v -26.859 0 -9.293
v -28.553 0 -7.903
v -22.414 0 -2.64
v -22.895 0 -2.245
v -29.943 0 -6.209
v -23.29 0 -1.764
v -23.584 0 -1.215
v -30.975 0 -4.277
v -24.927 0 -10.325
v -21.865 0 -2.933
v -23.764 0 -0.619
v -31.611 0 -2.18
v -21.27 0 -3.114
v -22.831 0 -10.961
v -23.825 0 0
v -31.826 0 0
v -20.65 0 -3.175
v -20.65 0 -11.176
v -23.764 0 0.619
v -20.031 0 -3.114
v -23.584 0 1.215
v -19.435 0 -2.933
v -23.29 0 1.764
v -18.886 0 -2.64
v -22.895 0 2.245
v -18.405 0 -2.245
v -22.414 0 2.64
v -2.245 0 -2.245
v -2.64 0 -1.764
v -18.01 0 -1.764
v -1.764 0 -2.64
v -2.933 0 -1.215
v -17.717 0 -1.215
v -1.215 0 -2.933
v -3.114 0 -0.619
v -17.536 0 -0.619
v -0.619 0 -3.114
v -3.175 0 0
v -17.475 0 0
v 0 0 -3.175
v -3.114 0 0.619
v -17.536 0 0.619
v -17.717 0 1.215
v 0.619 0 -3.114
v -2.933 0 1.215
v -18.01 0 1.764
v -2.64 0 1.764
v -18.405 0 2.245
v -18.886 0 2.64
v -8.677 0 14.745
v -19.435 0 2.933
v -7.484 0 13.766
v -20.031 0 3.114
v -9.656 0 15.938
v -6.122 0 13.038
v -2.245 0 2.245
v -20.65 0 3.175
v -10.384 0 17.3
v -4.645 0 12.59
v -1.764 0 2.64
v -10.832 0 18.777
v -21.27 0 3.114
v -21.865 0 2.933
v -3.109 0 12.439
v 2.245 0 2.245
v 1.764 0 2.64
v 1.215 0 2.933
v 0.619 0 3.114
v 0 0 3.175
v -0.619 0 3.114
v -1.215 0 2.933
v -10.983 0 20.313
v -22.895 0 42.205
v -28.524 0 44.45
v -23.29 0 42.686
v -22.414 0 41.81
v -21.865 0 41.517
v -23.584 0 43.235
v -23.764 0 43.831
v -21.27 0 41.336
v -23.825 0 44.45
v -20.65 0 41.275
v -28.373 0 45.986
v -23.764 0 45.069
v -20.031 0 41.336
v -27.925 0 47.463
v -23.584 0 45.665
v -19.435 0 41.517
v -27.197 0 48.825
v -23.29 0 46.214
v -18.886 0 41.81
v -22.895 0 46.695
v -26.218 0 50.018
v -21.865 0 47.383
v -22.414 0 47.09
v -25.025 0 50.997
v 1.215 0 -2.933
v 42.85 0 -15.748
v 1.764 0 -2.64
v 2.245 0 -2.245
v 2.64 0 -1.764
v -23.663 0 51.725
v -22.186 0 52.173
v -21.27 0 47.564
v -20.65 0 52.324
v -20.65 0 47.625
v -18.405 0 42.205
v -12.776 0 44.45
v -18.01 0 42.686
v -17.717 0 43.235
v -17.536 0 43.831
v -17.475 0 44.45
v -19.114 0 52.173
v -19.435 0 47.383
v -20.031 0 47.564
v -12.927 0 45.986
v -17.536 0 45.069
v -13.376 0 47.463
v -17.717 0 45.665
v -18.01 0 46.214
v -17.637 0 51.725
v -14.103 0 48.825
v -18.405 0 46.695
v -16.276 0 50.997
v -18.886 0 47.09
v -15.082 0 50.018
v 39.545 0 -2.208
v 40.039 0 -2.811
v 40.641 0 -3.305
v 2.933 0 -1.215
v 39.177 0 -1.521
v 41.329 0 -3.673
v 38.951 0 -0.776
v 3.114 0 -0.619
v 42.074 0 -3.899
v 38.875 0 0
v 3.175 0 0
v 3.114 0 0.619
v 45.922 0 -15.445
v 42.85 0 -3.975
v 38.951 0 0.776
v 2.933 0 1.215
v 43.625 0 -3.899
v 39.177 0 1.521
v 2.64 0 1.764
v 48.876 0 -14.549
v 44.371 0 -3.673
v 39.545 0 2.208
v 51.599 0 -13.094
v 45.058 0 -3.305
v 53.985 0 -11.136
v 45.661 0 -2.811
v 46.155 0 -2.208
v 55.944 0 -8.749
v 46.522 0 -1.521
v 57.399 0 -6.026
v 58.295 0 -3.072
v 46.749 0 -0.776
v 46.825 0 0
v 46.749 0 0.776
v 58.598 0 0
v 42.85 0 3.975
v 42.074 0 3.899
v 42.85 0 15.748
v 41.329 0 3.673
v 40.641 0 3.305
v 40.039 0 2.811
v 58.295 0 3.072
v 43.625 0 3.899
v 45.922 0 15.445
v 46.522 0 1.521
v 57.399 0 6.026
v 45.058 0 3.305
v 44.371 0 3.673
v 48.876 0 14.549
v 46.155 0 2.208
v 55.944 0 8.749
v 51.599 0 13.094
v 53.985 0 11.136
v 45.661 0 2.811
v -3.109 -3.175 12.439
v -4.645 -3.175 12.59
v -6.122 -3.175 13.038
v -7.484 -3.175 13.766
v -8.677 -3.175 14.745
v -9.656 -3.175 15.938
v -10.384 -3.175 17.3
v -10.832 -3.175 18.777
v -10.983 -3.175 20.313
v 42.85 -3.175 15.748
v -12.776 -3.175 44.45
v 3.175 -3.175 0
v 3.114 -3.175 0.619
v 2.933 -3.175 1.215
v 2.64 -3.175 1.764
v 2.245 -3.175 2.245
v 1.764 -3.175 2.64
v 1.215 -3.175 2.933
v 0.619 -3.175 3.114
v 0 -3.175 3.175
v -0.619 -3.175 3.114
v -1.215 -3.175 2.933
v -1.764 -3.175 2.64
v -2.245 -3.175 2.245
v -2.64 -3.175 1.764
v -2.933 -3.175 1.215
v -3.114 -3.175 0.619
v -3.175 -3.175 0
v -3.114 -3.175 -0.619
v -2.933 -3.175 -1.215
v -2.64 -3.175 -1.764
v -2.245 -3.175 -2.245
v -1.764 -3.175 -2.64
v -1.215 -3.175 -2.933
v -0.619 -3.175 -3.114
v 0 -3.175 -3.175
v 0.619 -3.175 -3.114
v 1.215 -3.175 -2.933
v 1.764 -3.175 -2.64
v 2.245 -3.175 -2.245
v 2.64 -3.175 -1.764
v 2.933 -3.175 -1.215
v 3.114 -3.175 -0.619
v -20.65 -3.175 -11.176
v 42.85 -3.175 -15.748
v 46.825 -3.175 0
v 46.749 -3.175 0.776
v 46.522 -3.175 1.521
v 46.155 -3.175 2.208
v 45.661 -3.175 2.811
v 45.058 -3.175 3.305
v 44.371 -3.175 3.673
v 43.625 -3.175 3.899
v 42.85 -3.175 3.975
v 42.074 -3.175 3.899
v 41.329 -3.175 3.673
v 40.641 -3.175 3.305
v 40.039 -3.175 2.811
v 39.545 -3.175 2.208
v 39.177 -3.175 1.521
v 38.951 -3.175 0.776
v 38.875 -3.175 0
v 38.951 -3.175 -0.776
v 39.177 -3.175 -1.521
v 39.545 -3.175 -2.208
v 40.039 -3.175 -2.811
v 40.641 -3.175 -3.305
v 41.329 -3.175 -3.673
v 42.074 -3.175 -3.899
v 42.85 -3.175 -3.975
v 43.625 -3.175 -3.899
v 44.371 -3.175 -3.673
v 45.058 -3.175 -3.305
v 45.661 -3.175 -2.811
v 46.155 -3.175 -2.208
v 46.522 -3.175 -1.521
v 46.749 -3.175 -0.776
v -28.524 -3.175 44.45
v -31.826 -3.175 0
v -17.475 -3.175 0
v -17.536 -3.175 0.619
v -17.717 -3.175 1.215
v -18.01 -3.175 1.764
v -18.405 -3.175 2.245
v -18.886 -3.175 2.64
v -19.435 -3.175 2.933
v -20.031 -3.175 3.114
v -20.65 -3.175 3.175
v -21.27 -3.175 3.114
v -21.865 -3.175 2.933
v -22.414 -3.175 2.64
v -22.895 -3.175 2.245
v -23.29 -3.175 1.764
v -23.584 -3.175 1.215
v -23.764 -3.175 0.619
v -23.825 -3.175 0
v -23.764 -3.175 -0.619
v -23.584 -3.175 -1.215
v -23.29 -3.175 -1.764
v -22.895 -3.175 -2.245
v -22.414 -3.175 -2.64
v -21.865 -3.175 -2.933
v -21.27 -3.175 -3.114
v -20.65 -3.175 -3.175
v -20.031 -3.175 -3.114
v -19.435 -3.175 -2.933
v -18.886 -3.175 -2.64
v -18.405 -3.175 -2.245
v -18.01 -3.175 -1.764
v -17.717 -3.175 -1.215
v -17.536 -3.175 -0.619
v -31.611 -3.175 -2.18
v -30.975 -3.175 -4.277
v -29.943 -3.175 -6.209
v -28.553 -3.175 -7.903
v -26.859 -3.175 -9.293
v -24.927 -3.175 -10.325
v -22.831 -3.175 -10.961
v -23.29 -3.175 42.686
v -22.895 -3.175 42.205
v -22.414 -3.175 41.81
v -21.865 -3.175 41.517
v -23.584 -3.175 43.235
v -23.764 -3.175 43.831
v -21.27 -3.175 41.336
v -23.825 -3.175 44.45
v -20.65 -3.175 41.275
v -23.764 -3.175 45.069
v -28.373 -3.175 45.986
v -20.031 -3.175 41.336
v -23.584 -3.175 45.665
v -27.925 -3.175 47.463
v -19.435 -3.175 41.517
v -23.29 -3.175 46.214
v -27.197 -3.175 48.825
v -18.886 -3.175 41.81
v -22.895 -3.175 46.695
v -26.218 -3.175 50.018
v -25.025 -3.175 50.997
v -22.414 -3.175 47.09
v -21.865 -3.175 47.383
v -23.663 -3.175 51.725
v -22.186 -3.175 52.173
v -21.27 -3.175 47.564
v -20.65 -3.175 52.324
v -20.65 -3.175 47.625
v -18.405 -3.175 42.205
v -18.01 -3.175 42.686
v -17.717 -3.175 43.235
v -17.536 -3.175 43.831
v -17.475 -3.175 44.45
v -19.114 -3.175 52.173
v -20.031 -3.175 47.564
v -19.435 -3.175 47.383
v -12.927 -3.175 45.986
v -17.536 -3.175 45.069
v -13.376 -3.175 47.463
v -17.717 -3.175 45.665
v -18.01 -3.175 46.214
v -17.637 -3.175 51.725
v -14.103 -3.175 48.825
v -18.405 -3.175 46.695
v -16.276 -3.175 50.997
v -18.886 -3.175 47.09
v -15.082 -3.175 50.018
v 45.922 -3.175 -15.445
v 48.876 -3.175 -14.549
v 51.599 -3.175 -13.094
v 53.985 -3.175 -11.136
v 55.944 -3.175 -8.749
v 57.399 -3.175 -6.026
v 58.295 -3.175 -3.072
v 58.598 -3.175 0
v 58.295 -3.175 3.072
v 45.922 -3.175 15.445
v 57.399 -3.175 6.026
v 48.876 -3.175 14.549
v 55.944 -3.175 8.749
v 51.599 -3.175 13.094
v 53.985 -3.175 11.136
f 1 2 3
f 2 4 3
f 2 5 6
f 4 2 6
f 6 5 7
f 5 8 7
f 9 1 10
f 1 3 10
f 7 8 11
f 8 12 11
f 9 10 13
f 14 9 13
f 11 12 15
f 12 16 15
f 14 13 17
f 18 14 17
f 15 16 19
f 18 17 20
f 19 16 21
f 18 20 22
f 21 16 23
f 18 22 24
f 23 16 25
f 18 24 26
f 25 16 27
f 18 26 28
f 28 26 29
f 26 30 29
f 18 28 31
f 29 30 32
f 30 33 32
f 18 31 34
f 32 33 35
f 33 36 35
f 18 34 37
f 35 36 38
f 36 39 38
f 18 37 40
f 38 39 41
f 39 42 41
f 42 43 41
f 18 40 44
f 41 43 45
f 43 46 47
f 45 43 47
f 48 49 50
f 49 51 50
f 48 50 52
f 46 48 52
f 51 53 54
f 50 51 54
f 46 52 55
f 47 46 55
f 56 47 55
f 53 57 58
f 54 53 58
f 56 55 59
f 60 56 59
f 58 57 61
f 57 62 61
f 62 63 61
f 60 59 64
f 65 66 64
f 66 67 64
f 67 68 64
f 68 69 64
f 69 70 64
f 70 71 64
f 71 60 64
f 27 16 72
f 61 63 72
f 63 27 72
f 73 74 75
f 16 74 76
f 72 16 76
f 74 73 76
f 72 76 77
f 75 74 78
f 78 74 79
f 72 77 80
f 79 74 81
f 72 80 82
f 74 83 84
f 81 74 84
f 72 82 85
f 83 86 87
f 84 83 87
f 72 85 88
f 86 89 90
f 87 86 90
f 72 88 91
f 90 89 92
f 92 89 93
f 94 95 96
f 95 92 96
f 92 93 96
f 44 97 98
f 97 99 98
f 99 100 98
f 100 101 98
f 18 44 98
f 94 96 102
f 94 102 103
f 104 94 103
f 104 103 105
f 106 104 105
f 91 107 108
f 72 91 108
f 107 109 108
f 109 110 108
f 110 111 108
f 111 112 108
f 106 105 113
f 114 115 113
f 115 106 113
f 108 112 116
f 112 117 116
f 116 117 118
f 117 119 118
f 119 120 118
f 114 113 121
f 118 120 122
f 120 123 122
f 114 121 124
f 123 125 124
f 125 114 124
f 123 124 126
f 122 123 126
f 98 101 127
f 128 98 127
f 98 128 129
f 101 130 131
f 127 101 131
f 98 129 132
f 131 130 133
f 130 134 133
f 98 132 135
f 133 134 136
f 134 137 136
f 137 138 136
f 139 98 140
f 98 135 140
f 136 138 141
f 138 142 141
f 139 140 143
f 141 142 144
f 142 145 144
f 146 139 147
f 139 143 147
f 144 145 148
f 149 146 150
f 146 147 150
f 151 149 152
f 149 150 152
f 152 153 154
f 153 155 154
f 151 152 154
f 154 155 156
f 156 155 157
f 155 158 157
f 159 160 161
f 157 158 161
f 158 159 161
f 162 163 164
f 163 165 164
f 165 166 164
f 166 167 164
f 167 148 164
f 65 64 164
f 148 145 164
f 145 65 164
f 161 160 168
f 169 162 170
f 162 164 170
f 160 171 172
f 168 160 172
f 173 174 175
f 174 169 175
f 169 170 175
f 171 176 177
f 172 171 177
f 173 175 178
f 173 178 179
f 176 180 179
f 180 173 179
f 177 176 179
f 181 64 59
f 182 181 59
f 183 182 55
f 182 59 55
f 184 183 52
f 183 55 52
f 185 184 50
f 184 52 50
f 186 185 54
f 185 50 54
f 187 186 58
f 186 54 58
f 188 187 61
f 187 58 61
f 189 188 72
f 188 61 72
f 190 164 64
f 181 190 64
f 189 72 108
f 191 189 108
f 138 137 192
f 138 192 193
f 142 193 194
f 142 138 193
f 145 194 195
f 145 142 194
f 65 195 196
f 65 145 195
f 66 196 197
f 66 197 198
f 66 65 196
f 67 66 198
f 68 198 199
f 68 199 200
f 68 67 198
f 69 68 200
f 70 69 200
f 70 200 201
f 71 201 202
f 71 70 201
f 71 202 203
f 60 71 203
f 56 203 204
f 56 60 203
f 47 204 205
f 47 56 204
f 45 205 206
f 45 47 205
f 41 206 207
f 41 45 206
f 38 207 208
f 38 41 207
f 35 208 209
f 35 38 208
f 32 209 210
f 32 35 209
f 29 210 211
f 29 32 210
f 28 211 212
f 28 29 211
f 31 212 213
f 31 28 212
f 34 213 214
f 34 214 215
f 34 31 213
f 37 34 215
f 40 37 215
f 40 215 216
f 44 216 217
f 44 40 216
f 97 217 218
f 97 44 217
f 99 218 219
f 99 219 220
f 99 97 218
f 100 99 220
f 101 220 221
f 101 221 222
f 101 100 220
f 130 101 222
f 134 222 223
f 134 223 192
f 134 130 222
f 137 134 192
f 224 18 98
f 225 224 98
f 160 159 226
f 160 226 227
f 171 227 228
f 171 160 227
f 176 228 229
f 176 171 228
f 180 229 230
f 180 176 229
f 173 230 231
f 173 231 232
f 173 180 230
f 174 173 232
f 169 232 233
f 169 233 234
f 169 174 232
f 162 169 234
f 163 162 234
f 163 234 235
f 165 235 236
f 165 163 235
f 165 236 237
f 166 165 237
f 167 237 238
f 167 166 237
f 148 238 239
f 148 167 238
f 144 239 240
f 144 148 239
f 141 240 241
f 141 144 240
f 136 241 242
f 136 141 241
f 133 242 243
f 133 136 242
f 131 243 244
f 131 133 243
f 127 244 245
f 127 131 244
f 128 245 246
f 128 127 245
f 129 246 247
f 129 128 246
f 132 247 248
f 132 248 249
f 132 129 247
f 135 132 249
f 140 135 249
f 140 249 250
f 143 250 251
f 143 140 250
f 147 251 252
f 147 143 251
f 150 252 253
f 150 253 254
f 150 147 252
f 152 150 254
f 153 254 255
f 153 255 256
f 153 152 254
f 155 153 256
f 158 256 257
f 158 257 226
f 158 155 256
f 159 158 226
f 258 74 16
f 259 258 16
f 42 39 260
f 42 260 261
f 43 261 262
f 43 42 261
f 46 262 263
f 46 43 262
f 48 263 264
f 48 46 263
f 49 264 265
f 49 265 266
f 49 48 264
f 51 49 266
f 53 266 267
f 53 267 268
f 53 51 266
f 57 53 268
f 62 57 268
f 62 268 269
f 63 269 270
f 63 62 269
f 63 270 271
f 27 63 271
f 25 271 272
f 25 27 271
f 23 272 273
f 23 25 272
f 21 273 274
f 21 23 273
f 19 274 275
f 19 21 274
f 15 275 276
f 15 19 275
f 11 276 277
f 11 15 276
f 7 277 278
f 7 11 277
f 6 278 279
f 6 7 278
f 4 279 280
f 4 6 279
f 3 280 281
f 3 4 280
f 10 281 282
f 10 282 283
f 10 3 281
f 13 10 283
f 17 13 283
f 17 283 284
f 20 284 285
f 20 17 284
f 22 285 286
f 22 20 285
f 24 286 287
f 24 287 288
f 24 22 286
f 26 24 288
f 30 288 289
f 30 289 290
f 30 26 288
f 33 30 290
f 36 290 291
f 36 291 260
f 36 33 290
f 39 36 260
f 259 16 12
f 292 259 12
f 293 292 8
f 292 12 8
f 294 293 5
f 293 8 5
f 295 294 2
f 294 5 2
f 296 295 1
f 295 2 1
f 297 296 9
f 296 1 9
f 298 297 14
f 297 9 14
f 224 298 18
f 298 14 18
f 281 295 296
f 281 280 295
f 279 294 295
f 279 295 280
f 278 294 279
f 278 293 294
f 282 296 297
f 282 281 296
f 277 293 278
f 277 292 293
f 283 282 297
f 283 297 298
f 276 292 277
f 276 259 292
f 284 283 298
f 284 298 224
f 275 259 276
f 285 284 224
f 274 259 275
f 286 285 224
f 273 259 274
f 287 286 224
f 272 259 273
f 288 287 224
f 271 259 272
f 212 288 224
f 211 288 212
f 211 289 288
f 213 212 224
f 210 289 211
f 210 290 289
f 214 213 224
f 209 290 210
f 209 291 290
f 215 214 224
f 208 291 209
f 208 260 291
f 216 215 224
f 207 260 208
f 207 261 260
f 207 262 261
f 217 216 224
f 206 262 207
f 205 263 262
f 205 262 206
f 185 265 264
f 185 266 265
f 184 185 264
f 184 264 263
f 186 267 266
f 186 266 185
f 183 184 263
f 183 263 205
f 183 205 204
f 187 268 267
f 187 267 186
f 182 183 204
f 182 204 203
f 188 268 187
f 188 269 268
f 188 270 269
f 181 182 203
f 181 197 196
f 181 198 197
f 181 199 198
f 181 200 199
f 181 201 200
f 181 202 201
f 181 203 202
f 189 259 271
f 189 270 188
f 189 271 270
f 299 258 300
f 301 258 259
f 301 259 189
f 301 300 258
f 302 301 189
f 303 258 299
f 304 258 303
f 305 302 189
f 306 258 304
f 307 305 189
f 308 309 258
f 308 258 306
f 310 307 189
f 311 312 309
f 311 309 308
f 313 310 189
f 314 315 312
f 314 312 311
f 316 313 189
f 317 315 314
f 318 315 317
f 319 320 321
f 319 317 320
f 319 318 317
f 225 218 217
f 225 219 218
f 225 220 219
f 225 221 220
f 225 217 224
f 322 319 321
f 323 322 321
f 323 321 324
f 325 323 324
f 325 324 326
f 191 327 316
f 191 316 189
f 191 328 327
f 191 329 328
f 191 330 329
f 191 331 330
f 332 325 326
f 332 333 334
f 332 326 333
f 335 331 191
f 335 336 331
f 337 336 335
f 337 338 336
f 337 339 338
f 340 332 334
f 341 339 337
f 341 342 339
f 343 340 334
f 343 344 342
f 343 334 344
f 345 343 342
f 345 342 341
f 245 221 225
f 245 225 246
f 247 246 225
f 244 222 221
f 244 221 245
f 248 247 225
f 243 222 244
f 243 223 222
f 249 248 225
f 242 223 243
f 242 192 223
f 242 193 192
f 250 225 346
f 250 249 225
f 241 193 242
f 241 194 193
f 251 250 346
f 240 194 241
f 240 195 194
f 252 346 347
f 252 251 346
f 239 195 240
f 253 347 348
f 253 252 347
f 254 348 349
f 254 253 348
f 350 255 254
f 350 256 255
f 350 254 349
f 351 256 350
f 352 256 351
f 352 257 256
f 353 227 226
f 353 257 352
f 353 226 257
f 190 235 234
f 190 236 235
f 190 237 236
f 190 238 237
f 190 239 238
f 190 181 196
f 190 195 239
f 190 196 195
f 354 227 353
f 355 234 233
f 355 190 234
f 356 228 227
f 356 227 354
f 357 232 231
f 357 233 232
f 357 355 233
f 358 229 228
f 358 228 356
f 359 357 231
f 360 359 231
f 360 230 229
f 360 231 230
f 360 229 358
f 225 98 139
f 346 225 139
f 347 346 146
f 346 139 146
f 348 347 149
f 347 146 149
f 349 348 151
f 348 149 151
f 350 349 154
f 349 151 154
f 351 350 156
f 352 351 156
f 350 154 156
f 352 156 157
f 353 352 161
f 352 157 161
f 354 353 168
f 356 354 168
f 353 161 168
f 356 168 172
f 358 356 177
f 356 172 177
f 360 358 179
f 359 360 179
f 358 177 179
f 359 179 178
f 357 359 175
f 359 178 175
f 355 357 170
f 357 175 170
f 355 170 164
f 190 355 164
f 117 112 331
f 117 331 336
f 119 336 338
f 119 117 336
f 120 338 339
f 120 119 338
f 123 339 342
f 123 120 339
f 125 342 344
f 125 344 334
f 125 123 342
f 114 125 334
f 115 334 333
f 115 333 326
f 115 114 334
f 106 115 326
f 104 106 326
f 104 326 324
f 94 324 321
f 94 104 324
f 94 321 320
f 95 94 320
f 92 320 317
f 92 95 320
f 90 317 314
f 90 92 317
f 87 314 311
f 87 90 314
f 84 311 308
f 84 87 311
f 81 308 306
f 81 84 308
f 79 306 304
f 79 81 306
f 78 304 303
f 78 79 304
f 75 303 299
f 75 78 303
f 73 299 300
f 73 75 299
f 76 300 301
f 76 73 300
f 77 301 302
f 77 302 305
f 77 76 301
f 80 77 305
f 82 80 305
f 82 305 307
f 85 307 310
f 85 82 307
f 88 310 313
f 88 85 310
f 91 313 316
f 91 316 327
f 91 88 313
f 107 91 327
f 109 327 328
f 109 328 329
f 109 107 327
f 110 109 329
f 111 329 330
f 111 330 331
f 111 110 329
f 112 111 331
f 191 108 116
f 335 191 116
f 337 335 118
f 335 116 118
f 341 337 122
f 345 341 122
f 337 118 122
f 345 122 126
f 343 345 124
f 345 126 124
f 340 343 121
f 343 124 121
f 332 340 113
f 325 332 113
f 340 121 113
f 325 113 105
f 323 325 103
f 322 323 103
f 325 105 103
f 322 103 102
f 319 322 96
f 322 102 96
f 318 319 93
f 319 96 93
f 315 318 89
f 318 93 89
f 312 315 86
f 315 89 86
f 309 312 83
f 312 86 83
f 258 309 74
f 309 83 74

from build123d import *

# Parameters (mm, degrees)
F0_R     = 3.175
F0_R_2   = 3.9751
F1_DEPTH = 3.175


with BuildPart() as f1:
    # F0 (on Front) → F1 (new body)
    with BuildSketch(Plane.XZ):
        with BuildLine():
            ThreePointArc((-12.7762, 44.45), (-20.6502, 52.324), (-28.5242, 44.45))
            Line((-28.5242, 44.45), (-31.8262, 0))
            ThreePointArc((-31.8262, 0), (-28.552825, -7.902625), (-20.6502, -11.176))
            Line((-20.6502, -11.176), (42.8498, -15.748))
            ThreePointArc((42.8498, -15.748), (58.5978, 0), (42.8498, 15.748))
            Line((42.8498, 15.748), (-3.109162, 12.438955))
            ThreePointArc((-3.109162, 12.438955), (-8.676921, 14.745196), (-10.983162, 20.312955))
            Line((-10.983162, 20.312955), (-12.7762, 44.45))
        make_face()
        with Locations((-20.6502, 0)):
            Circle(F0_R, mode=Mode.SUBTRACT)
        Circle(F0_R, mode=Mode.SUBTRACT)
        with Locations((42.8498, 0)):
            Circle(F0_R_2, mode=Mode.SUBTRACT)
        with Locations((-20.6502, 44.45)):
            Circle(F0_R, mode=Mode.SUBTRACT)
    extrude(amount=F1_DEPTH)


solid = f1.part
